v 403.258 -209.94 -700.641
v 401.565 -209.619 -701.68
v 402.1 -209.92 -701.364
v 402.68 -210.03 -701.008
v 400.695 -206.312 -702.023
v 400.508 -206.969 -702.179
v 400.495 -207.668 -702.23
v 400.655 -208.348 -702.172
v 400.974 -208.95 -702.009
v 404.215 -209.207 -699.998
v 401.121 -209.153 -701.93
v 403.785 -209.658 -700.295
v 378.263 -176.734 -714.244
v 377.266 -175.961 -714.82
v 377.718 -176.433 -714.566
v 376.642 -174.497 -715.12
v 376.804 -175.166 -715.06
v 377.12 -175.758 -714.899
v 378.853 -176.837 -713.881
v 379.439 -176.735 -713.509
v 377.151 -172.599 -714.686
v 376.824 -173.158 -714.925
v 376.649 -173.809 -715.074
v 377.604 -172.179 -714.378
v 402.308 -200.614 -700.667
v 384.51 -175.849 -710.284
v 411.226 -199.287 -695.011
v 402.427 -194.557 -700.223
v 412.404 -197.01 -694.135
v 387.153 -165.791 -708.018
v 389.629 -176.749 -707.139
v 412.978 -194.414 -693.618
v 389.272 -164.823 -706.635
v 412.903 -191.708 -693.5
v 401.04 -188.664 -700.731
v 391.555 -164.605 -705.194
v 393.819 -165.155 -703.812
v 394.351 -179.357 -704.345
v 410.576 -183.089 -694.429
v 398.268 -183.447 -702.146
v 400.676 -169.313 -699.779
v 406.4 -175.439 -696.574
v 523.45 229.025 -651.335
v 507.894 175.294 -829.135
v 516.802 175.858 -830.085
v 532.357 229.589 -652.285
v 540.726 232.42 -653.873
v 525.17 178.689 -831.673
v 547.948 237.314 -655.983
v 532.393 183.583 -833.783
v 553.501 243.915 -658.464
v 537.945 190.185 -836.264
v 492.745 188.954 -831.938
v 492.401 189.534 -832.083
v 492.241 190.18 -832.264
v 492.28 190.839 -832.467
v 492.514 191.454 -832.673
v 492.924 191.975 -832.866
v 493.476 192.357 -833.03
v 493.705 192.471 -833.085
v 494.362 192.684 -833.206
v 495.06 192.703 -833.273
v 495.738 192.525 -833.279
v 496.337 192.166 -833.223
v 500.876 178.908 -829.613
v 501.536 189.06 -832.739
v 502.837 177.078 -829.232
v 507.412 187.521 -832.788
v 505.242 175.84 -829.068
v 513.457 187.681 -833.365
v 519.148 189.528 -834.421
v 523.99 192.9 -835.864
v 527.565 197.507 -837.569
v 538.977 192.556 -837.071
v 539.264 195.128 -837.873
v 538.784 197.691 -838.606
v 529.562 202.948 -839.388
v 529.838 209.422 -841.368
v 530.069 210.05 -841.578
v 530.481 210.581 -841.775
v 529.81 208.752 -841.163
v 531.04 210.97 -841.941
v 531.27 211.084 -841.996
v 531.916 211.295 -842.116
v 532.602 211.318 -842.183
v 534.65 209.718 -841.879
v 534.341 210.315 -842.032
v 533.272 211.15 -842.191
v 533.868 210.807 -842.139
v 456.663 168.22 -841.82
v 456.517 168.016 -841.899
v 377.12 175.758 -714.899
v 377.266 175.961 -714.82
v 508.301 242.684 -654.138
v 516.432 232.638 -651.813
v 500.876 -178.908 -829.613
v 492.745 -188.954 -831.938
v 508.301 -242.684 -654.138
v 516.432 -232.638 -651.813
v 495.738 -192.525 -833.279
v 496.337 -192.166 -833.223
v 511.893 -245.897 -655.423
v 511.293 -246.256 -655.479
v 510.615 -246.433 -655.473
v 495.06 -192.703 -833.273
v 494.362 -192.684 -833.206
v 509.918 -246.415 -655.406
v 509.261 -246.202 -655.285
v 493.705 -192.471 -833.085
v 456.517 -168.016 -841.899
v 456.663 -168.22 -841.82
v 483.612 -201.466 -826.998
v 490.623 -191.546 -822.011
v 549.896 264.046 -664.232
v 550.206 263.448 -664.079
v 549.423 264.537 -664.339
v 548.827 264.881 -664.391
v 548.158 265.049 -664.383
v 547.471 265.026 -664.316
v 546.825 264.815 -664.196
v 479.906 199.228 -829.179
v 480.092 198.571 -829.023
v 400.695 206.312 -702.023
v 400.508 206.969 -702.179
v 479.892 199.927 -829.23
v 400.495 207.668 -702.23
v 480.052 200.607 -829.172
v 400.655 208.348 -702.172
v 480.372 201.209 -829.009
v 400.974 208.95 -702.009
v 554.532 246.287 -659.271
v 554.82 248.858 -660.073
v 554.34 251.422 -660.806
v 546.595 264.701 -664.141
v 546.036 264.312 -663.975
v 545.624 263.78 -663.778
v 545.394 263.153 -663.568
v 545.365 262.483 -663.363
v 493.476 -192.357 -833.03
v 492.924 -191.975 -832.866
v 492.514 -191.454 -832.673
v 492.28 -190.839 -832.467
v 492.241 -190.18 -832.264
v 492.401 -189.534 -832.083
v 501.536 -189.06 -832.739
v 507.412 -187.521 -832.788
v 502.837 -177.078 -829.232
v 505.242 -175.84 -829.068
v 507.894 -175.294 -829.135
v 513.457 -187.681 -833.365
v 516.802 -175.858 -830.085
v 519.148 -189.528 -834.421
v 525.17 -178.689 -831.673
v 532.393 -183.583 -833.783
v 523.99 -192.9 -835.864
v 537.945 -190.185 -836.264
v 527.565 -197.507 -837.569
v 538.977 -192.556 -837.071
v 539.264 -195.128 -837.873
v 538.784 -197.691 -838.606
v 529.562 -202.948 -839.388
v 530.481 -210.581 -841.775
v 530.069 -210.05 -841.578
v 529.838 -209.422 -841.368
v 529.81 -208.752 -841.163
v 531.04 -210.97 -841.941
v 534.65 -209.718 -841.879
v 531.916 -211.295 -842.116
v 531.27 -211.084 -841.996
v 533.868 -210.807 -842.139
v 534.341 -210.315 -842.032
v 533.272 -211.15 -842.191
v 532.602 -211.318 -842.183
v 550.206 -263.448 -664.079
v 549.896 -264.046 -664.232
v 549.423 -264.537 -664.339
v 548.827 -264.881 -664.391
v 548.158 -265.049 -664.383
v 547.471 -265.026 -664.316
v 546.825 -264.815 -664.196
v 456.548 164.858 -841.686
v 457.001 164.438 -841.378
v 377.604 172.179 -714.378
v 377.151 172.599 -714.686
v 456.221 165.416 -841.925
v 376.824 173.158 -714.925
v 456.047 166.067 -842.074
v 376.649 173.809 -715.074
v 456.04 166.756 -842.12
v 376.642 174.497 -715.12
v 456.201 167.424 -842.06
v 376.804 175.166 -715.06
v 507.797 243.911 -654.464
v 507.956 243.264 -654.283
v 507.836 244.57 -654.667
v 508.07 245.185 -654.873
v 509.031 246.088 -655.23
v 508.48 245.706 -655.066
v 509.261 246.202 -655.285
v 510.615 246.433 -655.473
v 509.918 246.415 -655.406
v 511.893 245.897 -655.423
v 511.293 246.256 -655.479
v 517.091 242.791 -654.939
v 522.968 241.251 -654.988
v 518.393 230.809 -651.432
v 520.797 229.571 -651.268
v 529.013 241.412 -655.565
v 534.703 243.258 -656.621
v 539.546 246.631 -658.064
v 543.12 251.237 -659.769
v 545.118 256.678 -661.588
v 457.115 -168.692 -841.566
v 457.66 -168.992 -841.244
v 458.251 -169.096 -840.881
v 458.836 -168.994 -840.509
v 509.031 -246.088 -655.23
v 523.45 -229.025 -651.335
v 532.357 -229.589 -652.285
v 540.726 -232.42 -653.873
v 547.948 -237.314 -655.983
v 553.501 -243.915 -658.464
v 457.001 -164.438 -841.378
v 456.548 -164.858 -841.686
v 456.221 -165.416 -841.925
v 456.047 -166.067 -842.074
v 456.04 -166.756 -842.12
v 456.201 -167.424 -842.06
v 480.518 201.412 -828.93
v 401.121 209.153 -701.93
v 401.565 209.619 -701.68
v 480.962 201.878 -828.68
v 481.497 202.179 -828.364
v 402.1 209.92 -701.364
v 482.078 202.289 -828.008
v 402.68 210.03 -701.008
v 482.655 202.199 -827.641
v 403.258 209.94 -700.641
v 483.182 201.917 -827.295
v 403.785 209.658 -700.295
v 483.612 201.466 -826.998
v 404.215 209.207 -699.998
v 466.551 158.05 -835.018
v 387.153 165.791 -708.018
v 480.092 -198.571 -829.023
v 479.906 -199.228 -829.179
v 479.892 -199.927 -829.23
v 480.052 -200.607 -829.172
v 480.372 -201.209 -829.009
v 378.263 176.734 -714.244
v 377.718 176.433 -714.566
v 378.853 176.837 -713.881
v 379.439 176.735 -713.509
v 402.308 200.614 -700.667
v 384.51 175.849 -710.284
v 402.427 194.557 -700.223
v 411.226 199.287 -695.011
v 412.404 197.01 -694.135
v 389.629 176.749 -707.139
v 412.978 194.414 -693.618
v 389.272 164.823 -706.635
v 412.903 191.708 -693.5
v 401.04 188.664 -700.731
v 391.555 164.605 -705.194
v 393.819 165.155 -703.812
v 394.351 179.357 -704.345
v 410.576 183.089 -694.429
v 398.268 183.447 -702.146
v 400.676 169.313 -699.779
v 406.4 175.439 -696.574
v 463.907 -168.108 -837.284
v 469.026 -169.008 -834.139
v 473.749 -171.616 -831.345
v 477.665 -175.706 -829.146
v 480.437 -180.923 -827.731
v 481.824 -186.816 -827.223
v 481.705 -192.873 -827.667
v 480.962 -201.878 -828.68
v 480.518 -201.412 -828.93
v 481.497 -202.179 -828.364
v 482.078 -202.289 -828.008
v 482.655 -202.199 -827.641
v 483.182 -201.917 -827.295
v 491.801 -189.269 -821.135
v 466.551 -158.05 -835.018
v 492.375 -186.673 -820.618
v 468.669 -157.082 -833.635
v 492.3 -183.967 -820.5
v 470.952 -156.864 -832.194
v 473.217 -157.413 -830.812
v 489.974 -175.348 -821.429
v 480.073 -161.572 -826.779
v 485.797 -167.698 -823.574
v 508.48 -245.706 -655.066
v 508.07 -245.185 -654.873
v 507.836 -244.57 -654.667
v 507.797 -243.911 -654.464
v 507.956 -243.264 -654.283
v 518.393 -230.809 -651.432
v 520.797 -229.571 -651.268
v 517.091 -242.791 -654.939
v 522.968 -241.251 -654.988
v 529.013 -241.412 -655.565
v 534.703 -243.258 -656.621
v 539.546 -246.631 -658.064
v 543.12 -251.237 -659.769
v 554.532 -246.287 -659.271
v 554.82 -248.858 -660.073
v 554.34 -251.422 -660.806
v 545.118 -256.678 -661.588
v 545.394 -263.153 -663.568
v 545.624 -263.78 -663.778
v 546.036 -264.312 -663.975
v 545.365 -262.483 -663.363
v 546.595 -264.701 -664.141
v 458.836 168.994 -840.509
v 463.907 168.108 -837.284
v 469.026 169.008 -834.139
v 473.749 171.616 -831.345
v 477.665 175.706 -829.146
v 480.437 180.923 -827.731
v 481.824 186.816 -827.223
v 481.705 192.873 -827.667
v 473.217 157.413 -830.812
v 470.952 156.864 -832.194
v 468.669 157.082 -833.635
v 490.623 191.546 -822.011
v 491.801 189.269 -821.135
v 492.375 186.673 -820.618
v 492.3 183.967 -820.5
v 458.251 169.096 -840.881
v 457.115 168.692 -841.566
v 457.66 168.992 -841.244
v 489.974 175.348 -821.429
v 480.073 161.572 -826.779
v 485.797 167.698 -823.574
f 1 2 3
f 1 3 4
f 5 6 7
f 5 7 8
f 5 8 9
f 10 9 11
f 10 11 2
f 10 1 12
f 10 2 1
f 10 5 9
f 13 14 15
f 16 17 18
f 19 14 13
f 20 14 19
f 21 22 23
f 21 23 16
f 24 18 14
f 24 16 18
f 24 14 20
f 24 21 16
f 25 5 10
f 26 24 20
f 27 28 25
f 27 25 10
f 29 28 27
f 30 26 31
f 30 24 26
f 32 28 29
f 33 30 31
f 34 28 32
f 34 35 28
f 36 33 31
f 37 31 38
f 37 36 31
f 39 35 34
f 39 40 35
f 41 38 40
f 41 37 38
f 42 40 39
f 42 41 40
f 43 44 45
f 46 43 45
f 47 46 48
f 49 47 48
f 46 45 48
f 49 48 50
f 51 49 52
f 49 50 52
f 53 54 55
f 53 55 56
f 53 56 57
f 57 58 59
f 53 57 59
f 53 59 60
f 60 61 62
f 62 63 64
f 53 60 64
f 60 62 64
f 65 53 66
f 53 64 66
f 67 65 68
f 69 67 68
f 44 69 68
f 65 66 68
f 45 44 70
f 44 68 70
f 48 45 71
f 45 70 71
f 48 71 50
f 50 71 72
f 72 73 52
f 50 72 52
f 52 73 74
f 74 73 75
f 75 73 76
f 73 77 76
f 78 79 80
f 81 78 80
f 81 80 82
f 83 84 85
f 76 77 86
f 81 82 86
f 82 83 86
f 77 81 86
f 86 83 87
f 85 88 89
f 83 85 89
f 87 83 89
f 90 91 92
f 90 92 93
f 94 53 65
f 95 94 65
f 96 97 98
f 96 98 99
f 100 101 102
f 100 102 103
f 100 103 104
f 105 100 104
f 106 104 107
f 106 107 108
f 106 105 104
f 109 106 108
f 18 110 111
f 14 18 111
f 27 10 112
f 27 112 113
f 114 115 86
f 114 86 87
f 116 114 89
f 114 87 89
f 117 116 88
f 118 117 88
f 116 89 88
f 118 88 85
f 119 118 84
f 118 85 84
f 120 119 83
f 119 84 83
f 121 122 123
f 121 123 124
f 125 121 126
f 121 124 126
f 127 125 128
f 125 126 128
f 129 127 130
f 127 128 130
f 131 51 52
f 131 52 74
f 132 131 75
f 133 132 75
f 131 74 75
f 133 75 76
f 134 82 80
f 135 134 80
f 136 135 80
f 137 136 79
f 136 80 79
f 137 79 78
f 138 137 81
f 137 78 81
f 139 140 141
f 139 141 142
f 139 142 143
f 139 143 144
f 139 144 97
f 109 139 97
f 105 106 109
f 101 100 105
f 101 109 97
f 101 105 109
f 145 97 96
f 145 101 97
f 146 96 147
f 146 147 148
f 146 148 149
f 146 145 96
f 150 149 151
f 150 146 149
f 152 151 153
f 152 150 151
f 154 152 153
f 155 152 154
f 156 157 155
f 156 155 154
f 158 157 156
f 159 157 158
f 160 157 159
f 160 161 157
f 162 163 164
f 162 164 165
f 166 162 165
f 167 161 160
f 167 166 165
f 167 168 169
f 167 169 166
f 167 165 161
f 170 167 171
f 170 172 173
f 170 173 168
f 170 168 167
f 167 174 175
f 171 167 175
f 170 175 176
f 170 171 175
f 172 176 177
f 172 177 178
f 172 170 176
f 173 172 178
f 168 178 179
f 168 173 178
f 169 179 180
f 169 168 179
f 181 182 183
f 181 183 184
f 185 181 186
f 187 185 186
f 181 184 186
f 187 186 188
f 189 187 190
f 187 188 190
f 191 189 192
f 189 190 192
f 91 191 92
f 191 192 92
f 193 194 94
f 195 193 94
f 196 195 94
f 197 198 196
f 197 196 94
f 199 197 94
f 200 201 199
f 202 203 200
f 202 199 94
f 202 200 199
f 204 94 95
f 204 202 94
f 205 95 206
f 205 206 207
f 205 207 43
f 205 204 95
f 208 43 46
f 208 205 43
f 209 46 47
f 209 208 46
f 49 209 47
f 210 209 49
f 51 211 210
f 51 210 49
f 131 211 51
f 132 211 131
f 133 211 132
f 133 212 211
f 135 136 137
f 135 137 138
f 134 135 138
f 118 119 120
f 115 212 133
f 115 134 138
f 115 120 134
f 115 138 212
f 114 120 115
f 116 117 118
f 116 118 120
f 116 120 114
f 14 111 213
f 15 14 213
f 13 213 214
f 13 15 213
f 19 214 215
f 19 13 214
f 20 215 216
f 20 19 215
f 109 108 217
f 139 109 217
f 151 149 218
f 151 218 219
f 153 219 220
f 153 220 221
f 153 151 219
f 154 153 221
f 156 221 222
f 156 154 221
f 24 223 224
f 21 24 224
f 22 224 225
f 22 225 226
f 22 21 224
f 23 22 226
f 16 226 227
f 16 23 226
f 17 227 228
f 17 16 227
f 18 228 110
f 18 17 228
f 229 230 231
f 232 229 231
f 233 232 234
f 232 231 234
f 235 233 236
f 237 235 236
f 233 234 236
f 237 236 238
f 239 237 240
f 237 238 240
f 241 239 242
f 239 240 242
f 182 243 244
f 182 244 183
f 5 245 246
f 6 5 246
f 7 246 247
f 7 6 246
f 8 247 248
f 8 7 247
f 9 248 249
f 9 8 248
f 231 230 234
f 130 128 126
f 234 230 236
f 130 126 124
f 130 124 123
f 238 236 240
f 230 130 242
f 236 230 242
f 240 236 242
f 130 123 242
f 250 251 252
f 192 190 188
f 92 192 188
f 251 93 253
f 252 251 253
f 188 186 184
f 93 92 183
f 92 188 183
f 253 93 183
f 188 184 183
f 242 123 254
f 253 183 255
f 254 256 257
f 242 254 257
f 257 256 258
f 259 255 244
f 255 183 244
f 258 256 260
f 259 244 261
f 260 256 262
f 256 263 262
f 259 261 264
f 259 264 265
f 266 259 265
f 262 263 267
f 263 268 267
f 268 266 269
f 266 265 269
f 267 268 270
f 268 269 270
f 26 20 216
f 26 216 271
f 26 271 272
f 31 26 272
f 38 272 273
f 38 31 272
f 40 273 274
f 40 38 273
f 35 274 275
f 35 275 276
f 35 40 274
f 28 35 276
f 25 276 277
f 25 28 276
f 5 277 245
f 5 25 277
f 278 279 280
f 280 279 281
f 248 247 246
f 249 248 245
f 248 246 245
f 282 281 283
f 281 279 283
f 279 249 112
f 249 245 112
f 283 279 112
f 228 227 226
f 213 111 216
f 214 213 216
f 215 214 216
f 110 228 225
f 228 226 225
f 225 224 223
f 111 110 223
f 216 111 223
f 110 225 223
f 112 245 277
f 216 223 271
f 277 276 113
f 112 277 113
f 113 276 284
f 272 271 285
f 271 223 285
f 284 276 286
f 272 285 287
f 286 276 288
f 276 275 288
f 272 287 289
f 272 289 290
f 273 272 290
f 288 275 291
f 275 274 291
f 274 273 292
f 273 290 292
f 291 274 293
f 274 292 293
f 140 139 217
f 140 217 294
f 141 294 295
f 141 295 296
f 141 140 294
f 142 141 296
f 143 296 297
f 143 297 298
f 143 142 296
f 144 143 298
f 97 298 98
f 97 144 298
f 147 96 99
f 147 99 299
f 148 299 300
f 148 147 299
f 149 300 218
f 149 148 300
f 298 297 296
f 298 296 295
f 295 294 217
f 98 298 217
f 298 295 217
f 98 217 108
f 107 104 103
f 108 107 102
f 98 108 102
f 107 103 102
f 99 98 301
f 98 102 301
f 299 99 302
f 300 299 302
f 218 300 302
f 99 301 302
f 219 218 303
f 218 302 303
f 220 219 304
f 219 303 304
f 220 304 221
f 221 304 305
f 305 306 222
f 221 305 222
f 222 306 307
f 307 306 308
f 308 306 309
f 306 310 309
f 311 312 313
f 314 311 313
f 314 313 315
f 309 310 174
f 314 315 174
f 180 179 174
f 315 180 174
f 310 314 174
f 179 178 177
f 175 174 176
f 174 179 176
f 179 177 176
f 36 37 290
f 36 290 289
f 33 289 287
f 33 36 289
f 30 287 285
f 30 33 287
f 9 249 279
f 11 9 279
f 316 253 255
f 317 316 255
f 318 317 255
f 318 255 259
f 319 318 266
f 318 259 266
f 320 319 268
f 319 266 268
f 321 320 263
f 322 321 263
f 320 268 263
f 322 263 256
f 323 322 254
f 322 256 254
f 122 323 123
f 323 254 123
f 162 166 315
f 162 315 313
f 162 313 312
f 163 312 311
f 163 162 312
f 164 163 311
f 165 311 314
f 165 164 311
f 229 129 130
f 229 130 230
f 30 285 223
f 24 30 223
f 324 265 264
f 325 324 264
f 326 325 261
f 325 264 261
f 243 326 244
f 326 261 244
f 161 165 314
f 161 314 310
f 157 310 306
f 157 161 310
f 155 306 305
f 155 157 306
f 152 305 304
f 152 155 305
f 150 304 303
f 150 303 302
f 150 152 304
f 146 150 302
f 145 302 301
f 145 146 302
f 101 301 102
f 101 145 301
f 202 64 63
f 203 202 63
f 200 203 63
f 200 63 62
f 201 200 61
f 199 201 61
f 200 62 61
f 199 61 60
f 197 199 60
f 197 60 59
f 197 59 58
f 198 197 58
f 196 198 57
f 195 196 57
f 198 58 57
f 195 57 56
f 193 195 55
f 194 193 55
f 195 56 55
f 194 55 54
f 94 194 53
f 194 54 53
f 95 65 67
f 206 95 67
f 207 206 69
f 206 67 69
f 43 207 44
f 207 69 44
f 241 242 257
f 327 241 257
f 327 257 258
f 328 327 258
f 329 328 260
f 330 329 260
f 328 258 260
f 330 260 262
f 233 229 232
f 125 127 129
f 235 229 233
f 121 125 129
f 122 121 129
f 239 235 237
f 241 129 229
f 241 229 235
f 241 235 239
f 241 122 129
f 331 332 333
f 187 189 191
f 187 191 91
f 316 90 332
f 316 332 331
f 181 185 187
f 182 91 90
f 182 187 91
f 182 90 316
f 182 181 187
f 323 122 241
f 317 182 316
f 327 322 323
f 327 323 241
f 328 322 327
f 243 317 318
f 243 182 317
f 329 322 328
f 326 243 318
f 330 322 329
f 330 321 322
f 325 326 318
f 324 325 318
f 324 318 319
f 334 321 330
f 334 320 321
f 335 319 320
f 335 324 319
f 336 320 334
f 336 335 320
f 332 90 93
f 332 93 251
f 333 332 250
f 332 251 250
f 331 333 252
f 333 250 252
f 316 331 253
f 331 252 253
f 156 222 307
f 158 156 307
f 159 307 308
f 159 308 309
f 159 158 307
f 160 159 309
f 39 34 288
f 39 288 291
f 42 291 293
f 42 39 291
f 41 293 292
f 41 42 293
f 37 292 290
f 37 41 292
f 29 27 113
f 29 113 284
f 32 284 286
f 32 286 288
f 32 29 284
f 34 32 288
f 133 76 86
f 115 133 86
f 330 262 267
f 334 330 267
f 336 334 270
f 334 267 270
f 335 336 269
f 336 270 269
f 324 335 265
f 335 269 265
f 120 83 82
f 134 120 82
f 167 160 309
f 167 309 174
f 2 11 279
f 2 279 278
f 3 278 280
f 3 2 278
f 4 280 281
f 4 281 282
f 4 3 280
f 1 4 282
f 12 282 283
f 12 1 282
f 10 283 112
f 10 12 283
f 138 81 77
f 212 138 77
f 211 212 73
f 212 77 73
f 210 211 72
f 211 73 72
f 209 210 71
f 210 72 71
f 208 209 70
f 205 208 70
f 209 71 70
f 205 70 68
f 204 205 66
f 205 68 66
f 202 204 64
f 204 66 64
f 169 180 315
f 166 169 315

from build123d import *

# Parameters (mm, degrees)
STRUCTURAL_START           = 795.952077949
STRUCTURAL_MEMBER3_DEPTH   = 149.976135589
STRUCTURAL_START_2         = -697.998386167
STRUCTURAL_MEMBER3_2_DEPTH = 186.391537724


# Read off the part's stored shape, not the designer's step: Structural Member3
with BuildPart() as part:
    # Structural Member3 outline → Structural Member3 (new body)
    with BuildSketch(Plane(origin=(0, 0, 0), x_dir=(0.8483730398559017, 0.03220930397512309, 0.528418154479097), z_dir=(0.5293988904839683, -0.05161609821289462, -0.8468013894412433)).offset(STRUCTURAL_START)):
        with BuildLine():
            ThreePointArc((-9.987638451, -233.546710042), (-17.652980521, -217.494597975), (-32.481832864, -207.66948174))
            ThreePointArc((-32.481832864, -207.66948174), (-36.507474456, -207.261253054), (-40.339341683, -208.560958573))
            Line((-40.339341683, -208.560958573), (-51.595202921, -215.323981259))
            ThreePointArc((-51.595202921, -215.323981259), (-52.720721088, -216.992588021), (-52.165963282, -218.927344711))
            Line((-52.165963282, -218.927344711), (-51.993828977, -219.125367305))
            ThreePointArc((-51.993828977, -219.125367305), (-50.818836781, -219.861679152), (-49.432869841, -219.818581138))
            ThreePointArc((-49.432869841, -219.818581138), (-27.237890667, -225.826434358), (-24.377988855, -248.641612693))
            ThreePointArc((-24.377988855, -248.641612693), (-24.61358906, -250.008087845), (-24.048000184, -251.274133271))
            Line((-24.048000184, -251.274133271), (-23.875865879, -251.472155864))
            ThreePointArc((-23.875865879, -251.472155864), (-22.037164824, -252.290824358), (-20.228134118, -251.408527596))
            Line((-20.228134118, -251.408527596), (-11.96417436, -241.203633809))
            ThreePointArc((-11.96417436, -241.203633809), (-10.14373922, -237.589985129), (-9.987638451, -233.546710042))
        make_face()
    extrude(amount=STRUCTURAL_MEMBER3_DEPTH)


with BuildPart() as body_2:
    # Structural Member3 2 outline → Structural Member3 2 (new body)
    with BuildSketch(Plane(origin=(0, 0, 0), x_dir=(0.9965114665905763, -0.024141912103041747, -0.0798878278181833), z_dir=(0.08345595816656048, 0.2882681208702779, 0.9539059668208498)).offset(STRUCTURAL_START_2)):
        with BuildLine():
            ThreePointArc((568.128186494, 407.649541721), (585.464720991, 411.633552573), (598.284520868, 423.965644933))
            ThreePointArc((598.284520868, 423.965644933), (599.559991632, 427.805646914), (599.126338057, 431.828629074))
            Line((599.126338057, 431.828629074), (594.978034465, 444.287540157))
            ThreePointArc((594.978034465, 444.287540157), (593.594721137, 445.749553805), (591.585577038, 445.629638576))
            Line((591.585577038, 445.629638576), (591.354809064, 445.504781422))
            ThreePointArc((591.354809064, 445.504781422), (590.380194098, 444.518430843), (590.120302536, 443.156366905))
            ThreePointArc((590.120302536, 443.156366905), (579.421245957, 422.803441091), (556.531041464, 424.982876598))
            ThreePointArc((556.531041464, 424.982876598), (555.248719811, 425.51052513), (553.889864023, 425.234349926))
            Line((553.889864023, 425.234349926), (553.659096048, 425.109492772))
            ThreePointArc((553.659096048, 425.109492772), (552.459503511, 423.493319076), (552.92648117, 421.535521452))
            Line((552.92648117, 421.535521452), (561.085809999, 411.246778034))
            ThreePointArc((561.085809999, 411.246778034), (564.216044632, 408.682782709), (568.128186494, 407.649541721))
        make_face()
    extrude(amount=STRUCTURAL_MEMBER3_2_DEPTH)


with BuildPart() as body_3:
    # Mirror1: mirrored copy
    add(body_2.part.mirror(Plane.ZX))


with BuildPart() as body_4:
    # Mirror1 2: mirrored copy
    add(part.part.mirror(Plane.ZX))


solid = Compound([part.part, body_2.part, body_3.part, body_4.part])
